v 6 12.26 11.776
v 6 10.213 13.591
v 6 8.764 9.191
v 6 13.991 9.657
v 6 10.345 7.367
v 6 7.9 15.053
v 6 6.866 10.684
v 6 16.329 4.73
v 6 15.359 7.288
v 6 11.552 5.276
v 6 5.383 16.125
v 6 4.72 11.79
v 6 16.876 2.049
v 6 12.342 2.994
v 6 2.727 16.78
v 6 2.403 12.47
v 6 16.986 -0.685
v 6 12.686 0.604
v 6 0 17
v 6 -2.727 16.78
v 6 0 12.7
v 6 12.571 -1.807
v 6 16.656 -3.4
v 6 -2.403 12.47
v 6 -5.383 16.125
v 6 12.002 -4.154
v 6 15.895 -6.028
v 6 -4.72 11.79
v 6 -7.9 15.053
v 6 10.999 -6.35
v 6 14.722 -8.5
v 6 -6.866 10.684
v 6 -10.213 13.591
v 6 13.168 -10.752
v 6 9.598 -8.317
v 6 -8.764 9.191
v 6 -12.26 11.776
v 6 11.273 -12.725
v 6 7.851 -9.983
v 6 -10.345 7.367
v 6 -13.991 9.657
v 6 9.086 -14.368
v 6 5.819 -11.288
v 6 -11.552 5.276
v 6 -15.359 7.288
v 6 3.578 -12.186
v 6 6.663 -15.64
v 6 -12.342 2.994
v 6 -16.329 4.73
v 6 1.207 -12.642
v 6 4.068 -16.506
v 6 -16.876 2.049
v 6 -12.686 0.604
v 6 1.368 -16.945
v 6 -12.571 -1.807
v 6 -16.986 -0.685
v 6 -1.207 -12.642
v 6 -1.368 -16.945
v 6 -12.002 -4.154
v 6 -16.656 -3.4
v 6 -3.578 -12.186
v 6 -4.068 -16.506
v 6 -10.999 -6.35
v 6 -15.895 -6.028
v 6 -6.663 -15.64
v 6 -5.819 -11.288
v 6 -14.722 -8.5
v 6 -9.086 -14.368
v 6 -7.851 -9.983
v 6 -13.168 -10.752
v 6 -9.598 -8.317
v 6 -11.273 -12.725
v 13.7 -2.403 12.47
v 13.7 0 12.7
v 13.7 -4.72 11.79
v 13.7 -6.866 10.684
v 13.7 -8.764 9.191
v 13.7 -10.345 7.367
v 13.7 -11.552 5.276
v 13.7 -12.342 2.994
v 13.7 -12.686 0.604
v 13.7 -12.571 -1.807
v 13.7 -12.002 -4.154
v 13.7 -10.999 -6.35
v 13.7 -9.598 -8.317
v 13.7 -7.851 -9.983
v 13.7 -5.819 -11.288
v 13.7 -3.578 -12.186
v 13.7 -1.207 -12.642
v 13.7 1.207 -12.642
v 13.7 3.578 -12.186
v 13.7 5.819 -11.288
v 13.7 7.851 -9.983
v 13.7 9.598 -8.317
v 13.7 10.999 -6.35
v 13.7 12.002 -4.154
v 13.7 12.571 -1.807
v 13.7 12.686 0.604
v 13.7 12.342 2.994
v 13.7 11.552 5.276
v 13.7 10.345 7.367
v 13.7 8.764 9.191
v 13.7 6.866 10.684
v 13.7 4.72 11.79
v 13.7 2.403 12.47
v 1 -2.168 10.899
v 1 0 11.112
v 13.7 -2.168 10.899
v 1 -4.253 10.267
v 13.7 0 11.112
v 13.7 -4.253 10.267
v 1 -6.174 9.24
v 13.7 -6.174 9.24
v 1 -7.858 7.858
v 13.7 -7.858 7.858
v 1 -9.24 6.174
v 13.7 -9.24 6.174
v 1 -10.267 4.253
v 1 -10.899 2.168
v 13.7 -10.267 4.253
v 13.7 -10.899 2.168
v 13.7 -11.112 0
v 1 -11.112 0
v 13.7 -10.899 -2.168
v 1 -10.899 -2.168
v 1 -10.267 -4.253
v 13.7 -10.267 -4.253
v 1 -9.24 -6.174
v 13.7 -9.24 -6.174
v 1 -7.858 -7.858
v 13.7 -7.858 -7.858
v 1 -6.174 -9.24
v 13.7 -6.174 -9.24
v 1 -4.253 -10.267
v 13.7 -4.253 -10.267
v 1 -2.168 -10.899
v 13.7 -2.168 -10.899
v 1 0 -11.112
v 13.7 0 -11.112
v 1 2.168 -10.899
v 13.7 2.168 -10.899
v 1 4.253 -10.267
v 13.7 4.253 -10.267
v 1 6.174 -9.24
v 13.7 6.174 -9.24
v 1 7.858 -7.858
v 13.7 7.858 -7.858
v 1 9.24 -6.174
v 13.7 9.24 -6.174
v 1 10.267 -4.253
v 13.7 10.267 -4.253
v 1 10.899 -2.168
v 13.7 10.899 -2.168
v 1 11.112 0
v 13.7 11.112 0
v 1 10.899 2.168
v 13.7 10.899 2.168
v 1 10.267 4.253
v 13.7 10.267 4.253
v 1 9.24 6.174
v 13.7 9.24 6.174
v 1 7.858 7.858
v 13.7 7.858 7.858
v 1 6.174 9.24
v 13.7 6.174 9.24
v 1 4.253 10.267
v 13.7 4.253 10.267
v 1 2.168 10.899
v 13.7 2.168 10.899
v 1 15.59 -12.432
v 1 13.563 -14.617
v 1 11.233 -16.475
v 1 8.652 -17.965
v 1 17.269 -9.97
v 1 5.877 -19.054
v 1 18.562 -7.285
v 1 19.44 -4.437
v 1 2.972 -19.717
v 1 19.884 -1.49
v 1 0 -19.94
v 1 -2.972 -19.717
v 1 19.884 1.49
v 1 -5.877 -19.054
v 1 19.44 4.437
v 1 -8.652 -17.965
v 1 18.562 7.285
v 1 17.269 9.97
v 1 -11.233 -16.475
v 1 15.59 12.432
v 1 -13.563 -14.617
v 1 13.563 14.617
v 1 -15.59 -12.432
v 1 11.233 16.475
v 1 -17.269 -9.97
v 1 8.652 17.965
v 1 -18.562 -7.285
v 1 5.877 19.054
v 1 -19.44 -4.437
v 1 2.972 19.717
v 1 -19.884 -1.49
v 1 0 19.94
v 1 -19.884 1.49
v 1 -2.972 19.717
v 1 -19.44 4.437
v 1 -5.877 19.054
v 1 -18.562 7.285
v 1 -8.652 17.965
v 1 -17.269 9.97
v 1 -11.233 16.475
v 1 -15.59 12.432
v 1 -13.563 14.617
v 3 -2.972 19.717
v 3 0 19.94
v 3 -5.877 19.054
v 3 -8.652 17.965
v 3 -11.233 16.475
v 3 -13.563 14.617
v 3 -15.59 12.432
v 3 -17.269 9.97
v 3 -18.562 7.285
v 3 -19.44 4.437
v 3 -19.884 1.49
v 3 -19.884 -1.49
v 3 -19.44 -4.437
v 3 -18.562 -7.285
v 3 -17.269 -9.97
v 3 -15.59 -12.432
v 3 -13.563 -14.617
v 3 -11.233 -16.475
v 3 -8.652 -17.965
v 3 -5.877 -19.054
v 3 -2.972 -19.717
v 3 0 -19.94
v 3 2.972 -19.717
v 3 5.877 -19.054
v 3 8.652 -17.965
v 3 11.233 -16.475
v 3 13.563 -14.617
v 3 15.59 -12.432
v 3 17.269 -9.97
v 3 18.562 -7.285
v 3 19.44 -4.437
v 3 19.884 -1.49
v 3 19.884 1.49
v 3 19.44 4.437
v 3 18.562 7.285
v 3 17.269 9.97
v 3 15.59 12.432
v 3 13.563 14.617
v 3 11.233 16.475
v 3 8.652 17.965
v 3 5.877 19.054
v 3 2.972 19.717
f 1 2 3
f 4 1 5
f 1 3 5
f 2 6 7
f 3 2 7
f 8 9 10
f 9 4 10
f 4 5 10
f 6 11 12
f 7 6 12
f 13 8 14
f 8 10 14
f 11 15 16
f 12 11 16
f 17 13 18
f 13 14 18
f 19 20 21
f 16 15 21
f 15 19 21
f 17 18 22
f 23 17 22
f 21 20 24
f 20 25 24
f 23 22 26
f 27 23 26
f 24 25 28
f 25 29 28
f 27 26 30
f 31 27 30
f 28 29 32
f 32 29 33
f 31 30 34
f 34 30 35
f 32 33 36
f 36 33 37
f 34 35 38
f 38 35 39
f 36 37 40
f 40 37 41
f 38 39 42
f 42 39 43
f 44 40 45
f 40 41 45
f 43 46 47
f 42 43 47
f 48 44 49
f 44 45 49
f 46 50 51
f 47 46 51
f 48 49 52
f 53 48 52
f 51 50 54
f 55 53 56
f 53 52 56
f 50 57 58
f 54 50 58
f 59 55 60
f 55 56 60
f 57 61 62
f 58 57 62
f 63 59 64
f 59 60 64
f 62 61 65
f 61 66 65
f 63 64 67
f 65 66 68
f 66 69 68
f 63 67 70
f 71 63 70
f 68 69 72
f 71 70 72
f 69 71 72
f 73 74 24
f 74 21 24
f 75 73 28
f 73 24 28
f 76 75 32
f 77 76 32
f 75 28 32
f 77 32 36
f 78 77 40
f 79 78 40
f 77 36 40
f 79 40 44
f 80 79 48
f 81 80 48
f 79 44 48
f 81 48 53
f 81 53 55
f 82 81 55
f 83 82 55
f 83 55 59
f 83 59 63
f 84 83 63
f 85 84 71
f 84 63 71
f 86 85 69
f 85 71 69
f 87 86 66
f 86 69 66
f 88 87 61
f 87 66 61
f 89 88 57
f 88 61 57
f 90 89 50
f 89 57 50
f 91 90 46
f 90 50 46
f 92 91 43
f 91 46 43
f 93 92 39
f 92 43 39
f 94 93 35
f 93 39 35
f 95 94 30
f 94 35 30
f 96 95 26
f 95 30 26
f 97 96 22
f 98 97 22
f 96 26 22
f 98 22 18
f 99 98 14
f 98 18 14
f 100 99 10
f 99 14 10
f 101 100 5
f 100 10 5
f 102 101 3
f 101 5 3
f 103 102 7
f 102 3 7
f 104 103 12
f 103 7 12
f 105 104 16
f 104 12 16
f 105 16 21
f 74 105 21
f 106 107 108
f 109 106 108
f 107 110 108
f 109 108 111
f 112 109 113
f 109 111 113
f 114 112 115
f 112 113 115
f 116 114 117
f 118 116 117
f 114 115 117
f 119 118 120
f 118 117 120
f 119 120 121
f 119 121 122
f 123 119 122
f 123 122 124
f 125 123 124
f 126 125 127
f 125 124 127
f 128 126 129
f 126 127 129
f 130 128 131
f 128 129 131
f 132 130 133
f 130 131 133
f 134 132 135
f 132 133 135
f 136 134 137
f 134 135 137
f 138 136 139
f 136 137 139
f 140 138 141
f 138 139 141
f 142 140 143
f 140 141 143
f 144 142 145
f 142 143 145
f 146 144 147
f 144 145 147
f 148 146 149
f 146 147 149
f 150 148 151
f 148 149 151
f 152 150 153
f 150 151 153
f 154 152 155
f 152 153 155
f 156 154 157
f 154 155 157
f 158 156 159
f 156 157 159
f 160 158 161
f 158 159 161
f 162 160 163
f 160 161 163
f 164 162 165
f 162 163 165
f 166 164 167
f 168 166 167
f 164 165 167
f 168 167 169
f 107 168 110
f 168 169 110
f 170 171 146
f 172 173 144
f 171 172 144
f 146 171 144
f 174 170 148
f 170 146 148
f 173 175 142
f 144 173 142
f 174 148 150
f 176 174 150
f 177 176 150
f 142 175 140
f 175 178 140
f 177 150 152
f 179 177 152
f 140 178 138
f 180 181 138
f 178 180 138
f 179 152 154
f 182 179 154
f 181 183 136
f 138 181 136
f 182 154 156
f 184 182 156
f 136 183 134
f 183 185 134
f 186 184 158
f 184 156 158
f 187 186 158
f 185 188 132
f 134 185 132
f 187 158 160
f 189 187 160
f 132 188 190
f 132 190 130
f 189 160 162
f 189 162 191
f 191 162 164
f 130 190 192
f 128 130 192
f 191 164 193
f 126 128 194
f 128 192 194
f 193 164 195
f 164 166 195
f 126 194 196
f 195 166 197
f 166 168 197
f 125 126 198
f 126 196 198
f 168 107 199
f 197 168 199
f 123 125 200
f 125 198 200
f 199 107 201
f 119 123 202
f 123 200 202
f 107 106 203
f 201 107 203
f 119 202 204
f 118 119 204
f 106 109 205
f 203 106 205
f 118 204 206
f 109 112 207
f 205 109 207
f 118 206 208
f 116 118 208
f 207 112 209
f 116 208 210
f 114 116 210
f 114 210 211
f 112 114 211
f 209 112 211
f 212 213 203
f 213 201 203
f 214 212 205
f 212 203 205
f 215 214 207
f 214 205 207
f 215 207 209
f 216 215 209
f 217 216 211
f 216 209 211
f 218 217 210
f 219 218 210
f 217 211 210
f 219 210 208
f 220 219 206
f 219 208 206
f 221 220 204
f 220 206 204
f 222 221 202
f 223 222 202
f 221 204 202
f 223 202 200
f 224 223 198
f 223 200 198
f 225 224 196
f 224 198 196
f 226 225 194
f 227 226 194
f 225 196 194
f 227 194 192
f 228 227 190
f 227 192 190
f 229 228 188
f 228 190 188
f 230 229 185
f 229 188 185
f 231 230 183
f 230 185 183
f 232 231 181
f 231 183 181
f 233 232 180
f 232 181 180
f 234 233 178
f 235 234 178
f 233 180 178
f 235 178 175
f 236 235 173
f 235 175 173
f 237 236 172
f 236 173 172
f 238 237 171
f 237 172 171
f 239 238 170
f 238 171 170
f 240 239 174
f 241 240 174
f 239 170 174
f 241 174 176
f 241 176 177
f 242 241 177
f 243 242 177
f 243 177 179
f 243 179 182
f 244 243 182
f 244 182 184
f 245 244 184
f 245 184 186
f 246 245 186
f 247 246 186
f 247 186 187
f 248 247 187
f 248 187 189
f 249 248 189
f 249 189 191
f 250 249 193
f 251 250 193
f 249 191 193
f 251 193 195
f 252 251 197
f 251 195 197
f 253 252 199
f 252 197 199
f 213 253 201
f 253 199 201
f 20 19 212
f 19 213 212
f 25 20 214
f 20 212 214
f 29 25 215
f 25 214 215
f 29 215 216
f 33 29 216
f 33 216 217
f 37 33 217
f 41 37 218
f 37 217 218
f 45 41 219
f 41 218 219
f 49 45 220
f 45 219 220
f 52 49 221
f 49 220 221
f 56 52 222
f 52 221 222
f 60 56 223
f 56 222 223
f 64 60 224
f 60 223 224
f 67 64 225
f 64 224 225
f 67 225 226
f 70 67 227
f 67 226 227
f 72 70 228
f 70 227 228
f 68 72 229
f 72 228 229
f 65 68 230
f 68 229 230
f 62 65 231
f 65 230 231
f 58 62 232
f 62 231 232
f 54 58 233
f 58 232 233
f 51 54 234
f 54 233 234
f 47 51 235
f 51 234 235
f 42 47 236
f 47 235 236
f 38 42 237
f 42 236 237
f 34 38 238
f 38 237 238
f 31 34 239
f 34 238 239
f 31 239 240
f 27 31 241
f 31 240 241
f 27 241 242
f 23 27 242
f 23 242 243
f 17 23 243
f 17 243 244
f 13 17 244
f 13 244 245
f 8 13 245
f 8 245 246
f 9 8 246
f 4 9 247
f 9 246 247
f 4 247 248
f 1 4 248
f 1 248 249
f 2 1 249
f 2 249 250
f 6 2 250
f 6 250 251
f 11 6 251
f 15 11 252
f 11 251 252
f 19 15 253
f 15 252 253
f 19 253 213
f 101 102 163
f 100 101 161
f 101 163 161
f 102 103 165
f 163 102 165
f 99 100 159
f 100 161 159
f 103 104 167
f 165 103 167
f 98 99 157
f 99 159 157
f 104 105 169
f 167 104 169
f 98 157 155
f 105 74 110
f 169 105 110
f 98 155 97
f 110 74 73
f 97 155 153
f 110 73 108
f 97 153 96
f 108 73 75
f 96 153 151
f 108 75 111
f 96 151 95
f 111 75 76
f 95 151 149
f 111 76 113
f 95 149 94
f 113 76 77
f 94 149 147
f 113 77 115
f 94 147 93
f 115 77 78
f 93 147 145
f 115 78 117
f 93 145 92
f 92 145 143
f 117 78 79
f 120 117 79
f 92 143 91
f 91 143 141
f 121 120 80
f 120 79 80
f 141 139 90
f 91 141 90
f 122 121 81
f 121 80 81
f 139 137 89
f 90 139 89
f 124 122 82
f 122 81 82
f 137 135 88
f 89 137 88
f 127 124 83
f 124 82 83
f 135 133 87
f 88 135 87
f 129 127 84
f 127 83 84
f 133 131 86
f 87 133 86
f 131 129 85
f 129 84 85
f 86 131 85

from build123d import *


with BuildPart() as part:
    # Axial profile (mm) → Full revolution (revolve)
    with BuildSketch(Plane.XY, mode=Mode.PRIVATE) as full_revolution_sk:
        Polygon((1, 11.1125), (13.7, 11.1125), (13.7, 12.7), (6, 12.7), (6, 17), (3, 19.94), (1, 19.94), align=None)
    revolve(full_revolution_sk.sketch.rotate(Axis((-110, 0, 0), (1, 0, 0)), 90), axis=Axis((-110, 0, 0), (1, 0, 0)))


solid = part.part
